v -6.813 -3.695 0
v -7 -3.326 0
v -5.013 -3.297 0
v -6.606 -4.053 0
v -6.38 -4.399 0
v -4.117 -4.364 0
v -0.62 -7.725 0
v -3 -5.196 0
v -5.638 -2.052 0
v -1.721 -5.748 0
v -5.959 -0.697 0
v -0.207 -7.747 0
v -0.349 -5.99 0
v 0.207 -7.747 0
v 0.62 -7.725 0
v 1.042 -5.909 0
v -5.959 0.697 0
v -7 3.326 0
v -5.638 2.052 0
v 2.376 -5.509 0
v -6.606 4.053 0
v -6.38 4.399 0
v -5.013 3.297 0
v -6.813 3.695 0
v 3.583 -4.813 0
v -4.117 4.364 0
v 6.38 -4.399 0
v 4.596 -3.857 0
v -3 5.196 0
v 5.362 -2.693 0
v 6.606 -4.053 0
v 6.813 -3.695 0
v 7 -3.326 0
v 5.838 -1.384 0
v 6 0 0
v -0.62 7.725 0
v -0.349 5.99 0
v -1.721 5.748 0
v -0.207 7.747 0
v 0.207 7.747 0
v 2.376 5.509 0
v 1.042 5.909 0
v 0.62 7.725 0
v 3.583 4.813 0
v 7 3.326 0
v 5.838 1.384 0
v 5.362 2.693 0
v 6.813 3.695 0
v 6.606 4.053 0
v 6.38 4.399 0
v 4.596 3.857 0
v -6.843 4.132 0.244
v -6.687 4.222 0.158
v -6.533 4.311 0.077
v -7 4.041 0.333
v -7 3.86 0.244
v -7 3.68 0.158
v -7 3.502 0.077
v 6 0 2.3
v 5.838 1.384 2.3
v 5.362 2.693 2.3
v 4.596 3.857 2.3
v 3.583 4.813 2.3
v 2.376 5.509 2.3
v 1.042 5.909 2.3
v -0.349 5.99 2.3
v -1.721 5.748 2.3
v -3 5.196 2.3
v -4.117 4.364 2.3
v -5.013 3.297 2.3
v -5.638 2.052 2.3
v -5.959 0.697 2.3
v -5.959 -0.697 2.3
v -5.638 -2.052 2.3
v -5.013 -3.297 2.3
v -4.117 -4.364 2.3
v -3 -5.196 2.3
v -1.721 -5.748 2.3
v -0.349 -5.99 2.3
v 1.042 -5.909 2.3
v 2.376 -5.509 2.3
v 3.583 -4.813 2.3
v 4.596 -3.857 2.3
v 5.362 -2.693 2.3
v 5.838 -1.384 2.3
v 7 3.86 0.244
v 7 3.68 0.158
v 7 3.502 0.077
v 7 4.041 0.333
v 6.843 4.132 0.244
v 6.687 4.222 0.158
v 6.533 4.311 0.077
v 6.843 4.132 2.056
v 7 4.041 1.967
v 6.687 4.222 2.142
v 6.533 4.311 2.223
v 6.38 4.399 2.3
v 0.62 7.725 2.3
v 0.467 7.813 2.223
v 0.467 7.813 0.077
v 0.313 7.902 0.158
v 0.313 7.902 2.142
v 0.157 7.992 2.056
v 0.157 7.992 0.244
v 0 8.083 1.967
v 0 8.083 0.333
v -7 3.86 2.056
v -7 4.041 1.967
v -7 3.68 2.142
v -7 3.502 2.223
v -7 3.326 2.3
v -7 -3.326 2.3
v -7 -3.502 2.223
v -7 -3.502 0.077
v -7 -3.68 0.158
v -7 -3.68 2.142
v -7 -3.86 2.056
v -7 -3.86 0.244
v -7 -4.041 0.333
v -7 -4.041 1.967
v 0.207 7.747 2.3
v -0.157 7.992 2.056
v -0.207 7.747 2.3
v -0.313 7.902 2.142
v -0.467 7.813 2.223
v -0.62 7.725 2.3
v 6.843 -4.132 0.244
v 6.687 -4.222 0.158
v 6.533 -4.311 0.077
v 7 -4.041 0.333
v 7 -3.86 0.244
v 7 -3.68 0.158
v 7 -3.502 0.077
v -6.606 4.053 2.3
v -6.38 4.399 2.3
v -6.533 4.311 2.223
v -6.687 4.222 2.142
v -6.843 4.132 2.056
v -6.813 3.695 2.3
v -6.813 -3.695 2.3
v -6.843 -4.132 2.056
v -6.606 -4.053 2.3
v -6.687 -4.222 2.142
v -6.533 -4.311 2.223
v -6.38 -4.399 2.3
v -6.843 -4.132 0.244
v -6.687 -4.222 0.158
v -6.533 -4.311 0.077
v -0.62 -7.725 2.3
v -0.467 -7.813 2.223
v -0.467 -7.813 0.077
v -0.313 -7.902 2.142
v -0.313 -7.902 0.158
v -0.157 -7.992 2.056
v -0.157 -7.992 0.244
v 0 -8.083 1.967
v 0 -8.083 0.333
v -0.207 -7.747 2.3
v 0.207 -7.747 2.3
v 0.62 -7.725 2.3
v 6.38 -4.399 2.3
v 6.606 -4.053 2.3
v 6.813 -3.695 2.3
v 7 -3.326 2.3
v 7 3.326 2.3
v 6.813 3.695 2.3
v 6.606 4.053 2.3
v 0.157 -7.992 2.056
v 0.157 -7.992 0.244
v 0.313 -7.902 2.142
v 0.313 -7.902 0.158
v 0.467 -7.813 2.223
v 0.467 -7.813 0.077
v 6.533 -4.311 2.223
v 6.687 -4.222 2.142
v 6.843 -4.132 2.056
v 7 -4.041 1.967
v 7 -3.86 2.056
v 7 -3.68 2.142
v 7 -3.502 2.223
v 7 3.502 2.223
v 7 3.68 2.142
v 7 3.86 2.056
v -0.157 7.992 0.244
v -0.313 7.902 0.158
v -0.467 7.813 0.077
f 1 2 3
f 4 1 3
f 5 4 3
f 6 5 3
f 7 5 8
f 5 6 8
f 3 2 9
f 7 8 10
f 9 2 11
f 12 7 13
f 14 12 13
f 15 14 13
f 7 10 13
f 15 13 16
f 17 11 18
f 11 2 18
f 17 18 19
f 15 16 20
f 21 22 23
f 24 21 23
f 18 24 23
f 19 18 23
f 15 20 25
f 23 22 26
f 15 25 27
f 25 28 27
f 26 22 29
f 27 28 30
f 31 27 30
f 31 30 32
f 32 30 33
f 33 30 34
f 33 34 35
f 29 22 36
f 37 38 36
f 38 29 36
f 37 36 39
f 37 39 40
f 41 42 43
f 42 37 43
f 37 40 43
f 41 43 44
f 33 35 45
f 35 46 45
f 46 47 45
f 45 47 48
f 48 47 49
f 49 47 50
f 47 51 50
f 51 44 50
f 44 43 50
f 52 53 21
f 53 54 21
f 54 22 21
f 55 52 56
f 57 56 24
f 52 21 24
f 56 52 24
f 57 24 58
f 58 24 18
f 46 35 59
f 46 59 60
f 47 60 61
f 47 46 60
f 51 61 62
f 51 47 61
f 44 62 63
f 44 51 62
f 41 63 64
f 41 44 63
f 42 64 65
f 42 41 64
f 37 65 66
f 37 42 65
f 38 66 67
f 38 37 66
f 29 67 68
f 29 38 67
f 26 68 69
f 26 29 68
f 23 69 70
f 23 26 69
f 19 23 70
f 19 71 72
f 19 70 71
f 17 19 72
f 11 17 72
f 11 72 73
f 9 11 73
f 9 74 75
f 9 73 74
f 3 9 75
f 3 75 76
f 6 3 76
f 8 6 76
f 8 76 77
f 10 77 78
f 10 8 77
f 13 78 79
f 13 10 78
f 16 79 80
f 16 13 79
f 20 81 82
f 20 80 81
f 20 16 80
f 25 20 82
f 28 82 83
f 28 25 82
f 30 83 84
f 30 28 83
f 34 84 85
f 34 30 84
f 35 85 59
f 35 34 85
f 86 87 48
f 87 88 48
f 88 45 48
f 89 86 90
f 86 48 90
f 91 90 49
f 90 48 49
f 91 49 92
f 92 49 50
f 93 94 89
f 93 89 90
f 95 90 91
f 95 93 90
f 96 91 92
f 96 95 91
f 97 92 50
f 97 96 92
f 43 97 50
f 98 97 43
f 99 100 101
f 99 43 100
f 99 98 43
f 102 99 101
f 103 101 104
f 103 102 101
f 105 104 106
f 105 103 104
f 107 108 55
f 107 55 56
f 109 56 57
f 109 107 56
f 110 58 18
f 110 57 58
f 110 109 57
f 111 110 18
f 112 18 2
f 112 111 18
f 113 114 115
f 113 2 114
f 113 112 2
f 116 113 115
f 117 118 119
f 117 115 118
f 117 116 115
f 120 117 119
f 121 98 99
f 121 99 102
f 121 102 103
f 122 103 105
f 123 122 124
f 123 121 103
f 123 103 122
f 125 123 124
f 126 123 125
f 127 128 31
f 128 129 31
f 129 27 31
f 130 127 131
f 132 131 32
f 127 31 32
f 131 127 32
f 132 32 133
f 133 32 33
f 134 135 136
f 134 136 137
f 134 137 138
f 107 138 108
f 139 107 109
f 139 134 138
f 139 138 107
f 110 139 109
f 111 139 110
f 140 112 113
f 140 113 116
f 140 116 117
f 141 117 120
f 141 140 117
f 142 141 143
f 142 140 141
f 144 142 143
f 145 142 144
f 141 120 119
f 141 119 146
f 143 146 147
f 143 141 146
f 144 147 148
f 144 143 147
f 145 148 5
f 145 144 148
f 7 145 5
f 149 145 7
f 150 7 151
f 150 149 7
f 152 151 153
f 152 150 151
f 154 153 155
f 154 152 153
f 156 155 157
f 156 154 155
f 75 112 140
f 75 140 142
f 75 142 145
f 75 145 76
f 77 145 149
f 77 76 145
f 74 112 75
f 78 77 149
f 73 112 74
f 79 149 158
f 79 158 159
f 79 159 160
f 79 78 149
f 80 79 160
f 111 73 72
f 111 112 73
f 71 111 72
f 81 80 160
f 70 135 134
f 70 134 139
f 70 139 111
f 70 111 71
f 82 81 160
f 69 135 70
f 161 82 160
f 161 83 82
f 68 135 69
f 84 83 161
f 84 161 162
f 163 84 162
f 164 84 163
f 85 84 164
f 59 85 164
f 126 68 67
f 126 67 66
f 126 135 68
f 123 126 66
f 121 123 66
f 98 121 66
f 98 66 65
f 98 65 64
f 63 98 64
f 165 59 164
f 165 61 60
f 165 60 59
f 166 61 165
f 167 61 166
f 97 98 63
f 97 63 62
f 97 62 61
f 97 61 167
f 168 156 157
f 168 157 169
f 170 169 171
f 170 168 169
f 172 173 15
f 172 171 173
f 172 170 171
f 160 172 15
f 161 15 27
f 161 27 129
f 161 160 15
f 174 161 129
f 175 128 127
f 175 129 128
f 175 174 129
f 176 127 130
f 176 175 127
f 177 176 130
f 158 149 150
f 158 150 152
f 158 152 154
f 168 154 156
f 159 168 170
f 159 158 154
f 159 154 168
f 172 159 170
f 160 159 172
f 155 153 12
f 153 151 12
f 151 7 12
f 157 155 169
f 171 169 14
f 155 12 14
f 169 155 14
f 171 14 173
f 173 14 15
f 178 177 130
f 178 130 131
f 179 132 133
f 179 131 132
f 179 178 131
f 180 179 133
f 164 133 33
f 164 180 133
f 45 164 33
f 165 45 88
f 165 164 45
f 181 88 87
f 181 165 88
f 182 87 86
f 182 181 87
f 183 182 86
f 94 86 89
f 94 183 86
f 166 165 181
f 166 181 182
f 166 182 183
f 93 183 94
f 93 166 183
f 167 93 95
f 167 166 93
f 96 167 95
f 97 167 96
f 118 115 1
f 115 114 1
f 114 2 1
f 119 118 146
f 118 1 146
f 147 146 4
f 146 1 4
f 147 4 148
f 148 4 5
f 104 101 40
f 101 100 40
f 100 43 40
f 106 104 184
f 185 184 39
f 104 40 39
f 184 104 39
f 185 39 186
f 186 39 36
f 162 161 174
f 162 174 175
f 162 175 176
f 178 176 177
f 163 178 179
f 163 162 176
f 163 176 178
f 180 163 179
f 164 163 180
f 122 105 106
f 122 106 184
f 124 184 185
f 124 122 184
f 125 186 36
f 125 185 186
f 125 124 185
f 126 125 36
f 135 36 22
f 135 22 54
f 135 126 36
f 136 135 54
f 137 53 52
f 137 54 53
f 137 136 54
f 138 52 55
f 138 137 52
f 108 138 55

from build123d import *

# Parameters (mm, degrees)
SKETCH024_R          = 8.5
PAD002_DEPTH         = 2.3
CHAMFER004_SIZE      = 0.75
CHAMFER005_SIZE      = 0.75
SKETCH025_R          = 9.684824
POCKET019_DEPTH      = 2.301
POCKET019_DEPTH_BACK = 0.001
SKETCH026_R          = 6
POCKET020_DEPTH      = 0.001
POCKET020_DEPTH_BACK = 2.301


with BuildPart() as part:
    # Sketch024 → Pad002 (new body)
    with BuildSketch(Plane.XY):
        Circle(SKETCH024_R)
    extrude(amount=PAD002_DEPTH)

    # Chamfer004
    chamfer004_edges = [part.edges().sort_by_distance(p)[0] for p in [
        (-8.5, 0, 2.3),
    ]]
    chamfer(chamfer004_edges, length=CHAMFER004_SIZE)

    # Chamfer005
    chamfer005_edges = [part.edges().sort_by_distance(p)[0] for p in [
        (-8.5, 0, 0),
    ]]
    chamfer(chamfer005_edges, length=CHAMFER005_SIZE)

    # Sketch025 (on Face3 of Pad002) → Pocket019 (cut, two sides)
    with BuildSketch(Plane.XY.offset(2.3)) as pocket019_sk:
        Circle(SKETCH025_R)
        Polygon((0, 8.082904), (-7, 4.041452), (-7, -4.041452), (0, -8.082904), (7, -4.041452), (7, 4.041452), align=None, mode=Mode.SUBTRACT)
    extrude(amount=-POCKET019_DEPTH, mode=Mode.SUBTRACT)
    extrude(pocket019_sk.sketch, amount=POCKET019_DEPTH_BACK, mode=Mode.SUBTRACT)

    # Sketch026 → Pocket020 (cut, two sides)
    with BuildSketch(Plane.XY) as pocket020_sk:
        Circle(SKETCH026_R)
    extrude(amount=-POCKET020_DEPTH, mode=Mode.SUBTRACT)
    extrude(pocket020_sk.sketch, amount=POCKET020_DEPTH_BACK, mode=Mode.SUBTRACT)


solid = part.part
